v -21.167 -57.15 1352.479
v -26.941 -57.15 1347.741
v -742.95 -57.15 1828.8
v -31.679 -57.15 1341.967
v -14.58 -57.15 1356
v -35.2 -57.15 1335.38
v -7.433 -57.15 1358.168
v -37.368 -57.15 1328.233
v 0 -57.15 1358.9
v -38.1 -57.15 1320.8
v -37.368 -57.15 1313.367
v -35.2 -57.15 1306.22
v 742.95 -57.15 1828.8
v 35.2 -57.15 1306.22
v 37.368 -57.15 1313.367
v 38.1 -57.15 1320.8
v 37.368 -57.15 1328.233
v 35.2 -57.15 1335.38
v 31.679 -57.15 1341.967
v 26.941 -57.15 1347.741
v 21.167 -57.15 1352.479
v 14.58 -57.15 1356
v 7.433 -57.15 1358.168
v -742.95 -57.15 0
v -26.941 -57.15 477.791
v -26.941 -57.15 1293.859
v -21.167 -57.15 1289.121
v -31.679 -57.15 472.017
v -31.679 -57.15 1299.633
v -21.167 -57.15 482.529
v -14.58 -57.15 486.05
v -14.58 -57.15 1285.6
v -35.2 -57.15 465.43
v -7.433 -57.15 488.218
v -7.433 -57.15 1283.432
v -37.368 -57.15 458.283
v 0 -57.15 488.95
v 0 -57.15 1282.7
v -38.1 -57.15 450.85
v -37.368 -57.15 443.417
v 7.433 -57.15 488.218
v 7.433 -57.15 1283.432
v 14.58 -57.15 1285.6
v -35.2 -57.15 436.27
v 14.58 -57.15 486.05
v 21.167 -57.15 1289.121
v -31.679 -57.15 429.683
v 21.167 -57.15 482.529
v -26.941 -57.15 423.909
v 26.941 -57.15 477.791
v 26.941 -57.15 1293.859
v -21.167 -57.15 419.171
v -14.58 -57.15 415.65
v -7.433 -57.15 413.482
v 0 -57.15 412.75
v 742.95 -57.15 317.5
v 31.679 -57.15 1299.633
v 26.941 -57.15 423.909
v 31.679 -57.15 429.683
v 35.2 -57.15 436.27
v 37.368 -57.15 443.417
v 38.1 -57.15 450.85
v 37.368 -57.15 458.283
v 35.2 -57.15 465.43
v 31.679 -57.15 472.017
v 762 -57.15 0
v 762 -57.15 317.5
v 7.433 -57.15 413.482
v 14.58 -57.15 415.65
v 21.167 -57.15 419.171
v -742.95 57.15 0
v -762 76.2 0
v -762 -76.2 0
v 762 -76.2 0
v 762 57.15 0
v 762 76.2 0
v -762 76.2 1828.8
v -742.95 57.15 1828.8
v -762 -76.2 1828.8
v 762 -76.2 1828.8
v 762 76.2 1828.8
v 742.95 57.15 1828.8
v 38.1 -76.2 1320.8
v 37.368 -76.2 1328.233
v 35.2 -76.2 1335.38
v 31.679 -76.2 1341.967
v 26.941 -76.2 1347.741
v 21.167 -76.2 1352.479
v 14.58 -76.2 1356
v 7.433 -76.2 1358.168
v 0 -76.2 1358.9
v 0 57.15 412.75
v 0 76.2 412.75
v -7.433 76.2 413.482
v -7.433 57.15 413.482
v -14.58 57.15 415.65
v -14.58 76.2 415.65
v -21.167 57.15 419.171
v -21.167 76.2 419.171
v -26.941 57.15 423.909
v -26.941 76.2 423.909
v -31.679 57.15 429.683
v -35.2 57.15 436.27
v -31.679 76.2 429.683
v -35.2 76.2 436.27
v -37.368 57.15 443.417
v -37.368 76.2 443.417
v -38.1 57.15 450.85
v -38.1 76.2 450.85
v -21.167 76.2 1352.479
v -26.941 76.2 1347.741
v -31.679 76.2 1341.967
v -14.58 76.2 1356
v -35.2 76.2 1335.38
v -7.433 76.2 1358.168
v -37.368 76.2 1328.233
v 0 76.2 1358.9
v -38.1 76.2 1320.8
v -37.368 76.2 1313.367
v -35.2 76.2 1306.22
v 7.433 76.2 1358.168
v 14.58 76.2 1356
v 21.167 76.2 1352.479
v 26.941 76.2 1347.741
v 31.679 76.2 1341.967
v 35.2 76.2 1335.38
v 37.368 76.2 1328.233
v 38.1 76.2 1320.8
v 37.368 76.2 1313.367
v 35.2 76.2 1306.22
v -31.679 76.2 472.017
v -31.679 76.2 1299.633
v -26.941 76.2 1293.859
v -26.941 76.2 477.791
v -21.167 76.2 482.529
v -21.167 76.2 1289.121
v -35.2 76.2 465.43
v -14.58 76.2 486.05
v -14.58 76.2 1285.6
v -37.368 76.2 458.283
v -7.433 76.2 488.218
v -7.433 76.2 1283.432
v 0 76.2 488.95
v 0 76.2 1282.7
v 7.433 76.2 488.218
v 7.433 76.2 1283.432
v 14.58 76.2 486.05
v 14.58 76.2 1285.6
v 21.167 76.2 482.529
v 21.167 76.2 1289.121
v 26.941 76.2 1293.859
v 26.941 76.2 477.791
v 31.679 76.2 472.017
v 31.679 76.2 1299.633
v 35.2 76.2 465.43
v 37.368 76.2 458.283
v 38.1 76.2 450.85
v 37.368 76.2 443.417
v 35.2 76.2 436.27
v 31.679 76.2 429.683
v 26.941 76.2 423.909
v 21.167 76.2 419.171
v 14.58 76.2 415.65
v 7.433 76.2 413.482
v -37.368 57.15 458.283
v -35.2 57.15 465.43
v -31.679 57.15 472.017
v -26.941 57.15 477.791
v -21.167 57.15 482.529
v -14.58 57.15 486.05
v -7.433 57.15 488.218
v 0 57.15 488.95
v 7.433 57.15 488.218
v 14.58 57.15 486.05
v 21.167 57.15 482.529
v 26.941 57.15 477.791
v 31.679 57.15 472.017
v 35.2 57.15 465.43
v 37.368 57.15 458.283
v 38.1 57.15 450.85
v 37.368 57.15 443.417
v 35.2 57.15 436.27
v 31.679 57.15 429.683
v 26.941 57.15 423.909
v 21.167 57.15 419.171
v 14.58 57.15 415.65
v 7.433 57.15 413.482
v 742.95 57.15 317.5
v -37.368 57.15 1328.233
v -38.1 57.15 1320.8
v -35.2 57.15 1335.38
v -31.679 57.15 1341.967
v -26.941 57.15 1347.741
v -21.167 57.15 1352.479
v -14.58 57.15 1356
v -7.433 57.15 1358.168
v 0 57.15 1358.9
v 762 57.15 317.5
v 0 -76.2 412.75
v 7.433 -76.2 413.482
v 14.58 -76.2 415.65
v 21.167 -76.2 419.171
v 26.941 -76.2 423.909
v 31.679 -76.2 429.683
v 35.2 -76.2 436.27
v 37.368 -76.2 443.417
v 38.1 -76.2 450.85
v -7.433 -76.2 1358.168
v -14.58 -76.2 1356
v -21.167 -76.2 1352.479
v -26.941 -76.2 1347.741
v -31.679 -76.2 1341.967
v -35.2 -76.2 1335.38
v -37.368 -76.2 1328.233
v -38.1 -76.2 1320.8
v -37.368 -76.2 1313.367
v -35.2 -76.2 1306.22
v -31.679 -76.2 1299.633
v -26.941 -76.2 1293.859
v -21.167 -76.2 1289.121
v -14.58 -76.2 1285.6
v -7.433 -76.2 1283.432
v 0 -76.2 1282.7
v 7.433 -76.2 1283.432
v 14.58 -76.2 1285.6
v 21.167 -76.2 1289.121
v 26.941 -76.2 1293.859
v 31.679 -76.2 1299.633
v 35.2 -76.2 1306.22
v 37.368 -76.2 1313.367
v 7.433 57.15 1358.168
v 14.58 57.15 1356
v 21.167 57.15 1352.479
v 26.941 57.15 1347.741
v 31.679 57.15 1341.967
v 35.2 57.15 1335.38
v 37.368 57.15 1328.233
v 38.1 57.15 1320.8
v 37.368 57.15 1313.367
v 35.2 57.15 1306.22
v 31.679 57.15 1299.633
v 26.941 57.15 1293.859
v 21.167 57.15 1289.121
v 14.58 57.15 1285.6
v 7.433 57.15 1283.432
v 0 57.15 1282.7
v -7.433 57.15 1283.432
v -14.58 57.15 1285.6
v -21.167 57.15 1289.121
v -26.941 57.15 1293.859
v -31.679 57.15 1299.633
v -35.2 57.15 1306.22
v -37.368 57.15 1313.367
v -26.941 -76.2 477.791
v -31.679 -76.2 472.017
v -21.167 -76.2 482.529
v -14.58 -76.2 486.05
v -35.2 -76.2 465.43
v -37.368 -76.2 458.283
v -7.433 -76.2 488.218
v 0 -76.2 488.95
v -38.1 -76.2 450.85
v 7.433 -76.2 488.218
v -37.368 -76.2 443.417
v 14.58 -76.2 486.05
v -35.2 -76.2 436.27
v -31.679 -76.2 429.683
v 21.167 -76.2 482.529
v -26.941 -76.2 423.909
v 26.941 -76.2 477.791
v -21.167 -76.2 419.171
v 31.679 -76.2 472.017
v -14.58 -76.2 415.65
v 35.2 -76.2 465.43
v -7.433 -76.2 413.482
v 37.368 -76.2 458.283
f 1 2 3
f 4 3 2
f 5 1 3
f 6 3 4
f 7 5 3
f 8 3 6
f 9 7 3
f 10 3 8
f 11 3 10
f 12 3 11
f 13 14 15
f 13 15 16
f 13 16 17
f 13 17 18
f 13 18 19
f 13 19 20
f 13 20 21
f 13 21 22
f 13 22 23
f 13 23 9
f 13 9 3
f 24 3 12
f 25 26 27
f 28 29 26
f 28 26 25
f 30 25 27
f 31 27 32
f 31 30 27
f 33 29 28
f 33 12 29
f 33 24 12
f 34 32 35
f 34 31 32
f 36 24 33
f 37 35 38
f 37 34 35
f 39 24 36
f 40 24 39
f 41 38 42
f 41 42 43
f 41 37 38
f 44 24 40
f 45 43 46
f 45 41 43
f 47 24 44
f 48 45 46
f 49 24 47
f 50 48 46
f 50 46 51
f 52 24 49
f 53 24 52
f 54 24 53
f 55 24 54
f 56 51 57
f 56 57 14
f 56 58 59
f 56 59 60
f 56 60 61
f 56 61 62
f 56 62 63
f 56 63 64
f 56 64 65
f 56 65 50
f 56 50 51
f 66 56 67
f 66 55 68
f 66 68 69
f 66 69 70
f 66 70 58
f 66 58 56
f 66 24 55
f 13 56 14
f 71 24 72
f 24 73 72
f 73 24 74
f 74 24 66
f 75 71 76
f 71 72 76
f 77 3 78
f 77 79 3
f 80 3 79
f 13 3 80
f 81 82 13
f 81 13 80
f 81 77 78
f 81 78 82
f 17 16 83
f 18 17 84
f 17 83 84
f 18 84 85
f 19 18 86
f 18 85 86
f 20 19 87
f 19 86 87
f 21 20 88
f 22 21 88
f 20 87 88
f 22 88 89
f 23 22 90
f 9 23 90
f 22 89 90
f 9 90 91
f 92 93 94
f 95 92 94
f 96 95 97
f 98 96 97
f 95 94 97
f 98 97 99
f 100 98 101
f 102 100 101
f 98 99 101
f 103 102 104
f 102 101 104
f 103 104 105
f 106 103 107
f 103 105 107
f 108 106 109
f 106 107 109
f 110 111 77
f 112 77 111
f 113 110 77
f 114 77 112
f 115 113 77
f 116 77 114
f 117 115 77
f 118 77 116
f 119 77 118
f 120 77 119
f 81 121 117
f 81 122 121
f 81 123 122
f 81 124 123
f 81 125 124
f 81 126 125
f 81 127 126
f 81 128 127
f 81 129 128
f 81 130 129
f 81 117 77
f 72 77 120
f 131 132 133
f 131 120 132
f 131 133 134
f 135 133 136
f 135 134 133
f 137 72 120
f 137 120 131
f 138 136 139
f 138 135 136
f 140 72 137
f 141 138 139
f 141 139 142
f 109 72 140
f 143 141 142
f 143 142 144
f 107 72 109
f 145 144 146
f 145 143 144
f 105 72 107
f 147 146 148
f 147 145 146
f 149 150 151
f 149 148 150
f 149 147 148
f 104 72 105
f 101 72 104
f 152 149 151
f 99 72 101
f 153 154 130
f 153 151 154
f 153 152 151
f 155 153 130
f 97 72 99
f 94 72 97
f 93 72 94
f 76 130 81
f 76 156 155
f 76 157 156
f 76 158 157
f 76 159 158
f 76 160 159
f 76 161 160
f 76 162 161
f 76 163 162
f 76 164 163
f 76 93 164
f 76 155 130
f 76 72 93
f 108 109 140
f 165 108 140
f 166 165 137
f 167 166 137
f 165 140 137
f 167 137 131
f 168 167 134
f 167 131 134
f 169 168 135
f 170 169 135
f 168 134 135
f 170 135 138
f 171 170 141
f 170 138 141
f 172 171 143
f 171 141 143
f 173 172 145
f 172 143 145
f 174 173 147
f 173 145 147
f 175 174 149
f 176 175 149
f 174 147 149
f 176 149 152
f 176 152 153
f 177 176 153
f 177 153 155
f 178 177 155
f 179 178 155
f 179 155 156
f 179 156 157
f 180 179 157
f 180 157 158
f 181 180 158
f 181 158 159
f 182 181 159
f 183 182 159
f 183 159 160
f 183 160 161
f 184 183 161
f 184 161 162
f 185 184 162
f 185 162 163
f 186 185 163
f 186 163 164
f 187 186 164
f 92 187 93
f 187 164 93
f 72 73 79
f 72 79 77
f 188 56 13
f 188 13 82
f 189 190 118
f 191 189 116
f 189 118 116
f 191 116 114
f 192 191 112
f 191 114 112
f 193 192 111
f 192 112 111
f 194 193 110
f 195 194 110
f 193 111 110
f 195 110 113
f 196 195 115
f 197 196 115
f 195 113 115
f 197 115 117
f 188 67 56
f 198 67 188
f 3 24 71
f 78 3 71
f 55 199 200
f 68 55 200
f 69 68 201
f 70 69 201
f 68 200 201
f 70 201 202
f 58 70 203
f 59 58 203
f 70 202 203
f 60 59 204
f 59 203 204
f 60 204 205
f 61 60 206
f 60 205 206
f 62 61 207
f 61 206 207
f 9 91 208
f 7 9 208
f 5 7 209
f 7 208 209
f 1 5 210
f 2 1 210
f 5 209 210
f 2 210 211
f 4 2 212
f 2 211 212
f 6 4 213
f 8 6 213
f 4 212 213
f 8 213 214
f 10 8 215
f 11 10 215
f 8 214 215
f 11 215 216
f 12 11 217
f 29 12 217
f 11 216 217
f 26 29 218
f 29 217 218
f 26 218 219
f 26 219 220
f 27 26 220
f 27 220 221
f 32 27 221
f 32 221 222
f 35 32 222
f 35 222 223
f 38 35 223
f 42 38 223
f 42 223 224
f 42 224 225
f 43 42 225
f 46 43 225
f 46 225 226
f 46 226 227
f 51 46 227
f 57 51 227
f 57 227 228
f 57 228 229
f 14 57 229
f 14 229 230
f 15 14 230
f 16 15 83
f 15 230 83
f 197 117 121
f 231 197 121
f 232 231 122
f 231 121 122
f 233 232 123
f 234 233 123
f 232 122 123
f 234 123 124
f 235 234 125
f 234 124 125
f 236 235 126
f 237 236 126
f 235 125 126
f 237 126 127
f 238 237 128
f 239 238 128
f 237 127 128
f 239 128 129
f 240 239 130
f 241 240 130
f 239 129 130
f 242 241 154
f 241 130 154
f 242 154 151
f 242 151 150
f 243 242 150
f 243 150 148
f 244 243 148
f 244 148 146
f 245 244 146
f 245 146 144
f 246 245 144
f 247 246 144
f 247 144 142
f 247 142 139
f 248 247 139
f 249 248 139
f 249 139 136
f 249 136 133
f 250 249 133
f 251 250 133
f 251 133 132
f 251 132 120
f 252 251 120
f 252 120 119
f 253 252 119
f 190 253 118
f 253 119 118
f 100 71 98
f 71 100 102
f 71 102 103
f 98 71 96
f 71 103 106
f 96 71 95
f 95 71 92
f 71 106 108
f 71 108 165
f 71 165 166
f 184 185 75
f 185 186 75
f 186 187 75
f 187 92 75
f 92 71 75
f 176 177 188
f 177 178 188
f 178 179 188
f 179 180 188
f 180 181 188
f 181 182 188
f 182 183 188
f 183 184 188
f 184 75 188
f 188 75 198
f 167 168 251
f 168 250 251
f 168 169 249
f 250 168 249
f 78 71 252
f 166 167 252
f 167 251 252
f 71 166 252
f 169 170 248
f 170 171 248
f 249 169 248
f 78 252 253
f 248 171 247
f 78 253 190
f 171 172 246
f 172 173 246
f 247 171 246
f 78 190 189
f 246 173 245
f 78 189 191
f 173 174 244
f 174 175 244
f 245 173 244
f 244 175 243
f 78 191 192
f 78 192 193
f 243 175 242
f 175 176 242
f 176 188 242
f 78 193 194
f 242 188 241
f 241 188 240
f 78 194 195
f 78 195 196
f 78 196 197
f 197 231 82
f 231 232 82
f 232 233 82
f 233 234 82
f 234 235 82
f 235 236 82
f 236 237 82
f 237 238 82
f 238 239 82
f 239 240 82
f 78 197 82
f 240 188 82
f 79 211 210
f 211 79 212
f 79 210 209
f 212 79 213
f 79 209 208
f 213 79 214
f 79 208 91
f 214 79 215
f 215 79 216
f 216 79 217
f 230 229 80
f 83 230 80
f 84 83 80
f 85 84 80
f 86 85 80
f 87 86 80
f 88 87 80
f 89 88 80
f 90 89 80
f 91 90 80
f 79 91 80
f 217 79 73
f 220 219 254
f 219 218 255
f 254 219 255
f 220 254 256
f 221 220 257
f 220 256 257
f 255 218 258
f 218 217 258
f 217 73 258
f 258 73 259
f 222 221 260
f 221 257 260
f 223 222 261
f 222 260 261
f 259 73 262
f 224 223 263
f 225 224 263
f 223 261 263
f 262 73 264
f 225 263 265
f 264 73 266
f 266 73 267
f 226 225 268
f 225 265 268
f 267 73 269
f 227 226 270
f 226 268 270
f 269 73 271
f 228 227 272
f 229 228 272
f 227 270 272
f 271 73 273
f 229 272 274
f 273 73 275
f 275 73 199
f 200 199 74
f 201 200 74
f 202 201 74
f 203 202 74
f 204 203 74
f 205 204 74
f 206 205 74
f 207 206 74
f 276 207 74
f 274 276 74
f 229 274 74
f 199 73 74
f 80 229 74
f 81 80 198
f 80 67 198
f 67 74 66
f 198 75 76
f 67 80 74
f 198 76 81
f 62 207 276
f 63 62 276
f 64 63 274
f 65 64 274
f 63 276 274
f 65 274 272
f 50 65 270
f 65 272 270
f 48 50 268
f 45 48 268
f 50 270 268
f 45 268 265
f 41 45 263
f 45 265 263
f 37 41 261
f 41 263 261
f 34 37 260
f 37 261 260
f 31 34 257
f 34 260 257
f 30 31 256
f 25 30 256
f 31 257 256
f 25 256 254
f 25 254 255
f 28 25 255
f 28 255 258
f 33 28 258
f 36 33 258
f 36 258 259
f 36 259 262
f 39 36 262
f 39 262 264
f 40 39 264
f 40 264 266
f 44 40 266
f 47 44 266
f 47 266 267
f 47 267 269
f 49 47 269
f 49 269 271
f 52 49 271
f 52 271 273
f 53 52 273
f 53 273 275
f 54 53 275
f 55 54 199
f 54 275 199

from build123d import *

# Parameters (mm, degrees)
F0_W     = 1524
F0_H     = 152.4
F0_W_2   = 1485.9
F0_H_2   = 114.3
F1_DEPTH = 1828.8
F2_W     = 114.3
F2_H     = 317.5
F3_DEPTH = 25.4
F5_DEPTH = 25.4
F7_DEPTH = 25.4


with BuildPart() as f1:
    # F0 (on Top) → F1 (new body)
    with BuildSketch(Plane.XY):
        Rectangle(F0_W, F0_H)
        Rectangle(F0_W_2, F0_H_2, mode=Mode.SUBTRACT)
    extrude(amount=F1_DEPTH)

    # F2 (on face) → F3 (cut)
    with BuildSketch(Plane.YZ.offset(762)):
        with Locations((0, 158.75)):
            Rectangle(F2_W, F2_H)
    extrude(amount=-F3_DEPTH, mode=Mode.SUBTRACT)

    # F4 (on face) → F5 (cut)
    with BuildSketch(Plane(origin=(0, 76.2, 0), x_dir=(-1, 0, 0), z_dir=(0, 1, 0))):
        with BuildLine():
            ThreePointArc((38.1, 1320.8), (26.940768, 1347.740768), (0, 1358.9))
            ThreePointArc((0, 1358.9), (-26.940768, 1293.859232), (38.1, 1320.8))
        make_face()
        with BuildLine():
            ThreePointArc((38.1, 450.85), (-26.940768, 477.790768), (0, 412.75))
            ThreePointArc((0, 412.75), (26.940768, 423.909232), (38.1, 450.85))
        make_face()
    extrude(amount=-F5_DEPTH, mode=Mode.SUBTRACT)

    # F6 (on face) → F7 (cut)
    with BuildSketch(Plane.XZ.offset(76.2)):
        with BuildLine():
            ThreePointArc((38.1, 1320.8), (26.940768, 1347.740768), (0, 1358.9))
            ThreePointArc((0, 1358.9), (-26.940768, 1293.859232), (38.1, 1320.8))
        make_face()
        with BuildLine():
            ThreePointArc((38.1, 450.85), (-26.940768, 477.790768), (0, 412.75))
            ThreePointArc((0, 412.75), (26.940768, 423.909232), (38.1, 450.85))
        make_face()
    extrude(amount=-F7_DEPTH, mode=Mode.SUBTRACT)


solid = f1.part
